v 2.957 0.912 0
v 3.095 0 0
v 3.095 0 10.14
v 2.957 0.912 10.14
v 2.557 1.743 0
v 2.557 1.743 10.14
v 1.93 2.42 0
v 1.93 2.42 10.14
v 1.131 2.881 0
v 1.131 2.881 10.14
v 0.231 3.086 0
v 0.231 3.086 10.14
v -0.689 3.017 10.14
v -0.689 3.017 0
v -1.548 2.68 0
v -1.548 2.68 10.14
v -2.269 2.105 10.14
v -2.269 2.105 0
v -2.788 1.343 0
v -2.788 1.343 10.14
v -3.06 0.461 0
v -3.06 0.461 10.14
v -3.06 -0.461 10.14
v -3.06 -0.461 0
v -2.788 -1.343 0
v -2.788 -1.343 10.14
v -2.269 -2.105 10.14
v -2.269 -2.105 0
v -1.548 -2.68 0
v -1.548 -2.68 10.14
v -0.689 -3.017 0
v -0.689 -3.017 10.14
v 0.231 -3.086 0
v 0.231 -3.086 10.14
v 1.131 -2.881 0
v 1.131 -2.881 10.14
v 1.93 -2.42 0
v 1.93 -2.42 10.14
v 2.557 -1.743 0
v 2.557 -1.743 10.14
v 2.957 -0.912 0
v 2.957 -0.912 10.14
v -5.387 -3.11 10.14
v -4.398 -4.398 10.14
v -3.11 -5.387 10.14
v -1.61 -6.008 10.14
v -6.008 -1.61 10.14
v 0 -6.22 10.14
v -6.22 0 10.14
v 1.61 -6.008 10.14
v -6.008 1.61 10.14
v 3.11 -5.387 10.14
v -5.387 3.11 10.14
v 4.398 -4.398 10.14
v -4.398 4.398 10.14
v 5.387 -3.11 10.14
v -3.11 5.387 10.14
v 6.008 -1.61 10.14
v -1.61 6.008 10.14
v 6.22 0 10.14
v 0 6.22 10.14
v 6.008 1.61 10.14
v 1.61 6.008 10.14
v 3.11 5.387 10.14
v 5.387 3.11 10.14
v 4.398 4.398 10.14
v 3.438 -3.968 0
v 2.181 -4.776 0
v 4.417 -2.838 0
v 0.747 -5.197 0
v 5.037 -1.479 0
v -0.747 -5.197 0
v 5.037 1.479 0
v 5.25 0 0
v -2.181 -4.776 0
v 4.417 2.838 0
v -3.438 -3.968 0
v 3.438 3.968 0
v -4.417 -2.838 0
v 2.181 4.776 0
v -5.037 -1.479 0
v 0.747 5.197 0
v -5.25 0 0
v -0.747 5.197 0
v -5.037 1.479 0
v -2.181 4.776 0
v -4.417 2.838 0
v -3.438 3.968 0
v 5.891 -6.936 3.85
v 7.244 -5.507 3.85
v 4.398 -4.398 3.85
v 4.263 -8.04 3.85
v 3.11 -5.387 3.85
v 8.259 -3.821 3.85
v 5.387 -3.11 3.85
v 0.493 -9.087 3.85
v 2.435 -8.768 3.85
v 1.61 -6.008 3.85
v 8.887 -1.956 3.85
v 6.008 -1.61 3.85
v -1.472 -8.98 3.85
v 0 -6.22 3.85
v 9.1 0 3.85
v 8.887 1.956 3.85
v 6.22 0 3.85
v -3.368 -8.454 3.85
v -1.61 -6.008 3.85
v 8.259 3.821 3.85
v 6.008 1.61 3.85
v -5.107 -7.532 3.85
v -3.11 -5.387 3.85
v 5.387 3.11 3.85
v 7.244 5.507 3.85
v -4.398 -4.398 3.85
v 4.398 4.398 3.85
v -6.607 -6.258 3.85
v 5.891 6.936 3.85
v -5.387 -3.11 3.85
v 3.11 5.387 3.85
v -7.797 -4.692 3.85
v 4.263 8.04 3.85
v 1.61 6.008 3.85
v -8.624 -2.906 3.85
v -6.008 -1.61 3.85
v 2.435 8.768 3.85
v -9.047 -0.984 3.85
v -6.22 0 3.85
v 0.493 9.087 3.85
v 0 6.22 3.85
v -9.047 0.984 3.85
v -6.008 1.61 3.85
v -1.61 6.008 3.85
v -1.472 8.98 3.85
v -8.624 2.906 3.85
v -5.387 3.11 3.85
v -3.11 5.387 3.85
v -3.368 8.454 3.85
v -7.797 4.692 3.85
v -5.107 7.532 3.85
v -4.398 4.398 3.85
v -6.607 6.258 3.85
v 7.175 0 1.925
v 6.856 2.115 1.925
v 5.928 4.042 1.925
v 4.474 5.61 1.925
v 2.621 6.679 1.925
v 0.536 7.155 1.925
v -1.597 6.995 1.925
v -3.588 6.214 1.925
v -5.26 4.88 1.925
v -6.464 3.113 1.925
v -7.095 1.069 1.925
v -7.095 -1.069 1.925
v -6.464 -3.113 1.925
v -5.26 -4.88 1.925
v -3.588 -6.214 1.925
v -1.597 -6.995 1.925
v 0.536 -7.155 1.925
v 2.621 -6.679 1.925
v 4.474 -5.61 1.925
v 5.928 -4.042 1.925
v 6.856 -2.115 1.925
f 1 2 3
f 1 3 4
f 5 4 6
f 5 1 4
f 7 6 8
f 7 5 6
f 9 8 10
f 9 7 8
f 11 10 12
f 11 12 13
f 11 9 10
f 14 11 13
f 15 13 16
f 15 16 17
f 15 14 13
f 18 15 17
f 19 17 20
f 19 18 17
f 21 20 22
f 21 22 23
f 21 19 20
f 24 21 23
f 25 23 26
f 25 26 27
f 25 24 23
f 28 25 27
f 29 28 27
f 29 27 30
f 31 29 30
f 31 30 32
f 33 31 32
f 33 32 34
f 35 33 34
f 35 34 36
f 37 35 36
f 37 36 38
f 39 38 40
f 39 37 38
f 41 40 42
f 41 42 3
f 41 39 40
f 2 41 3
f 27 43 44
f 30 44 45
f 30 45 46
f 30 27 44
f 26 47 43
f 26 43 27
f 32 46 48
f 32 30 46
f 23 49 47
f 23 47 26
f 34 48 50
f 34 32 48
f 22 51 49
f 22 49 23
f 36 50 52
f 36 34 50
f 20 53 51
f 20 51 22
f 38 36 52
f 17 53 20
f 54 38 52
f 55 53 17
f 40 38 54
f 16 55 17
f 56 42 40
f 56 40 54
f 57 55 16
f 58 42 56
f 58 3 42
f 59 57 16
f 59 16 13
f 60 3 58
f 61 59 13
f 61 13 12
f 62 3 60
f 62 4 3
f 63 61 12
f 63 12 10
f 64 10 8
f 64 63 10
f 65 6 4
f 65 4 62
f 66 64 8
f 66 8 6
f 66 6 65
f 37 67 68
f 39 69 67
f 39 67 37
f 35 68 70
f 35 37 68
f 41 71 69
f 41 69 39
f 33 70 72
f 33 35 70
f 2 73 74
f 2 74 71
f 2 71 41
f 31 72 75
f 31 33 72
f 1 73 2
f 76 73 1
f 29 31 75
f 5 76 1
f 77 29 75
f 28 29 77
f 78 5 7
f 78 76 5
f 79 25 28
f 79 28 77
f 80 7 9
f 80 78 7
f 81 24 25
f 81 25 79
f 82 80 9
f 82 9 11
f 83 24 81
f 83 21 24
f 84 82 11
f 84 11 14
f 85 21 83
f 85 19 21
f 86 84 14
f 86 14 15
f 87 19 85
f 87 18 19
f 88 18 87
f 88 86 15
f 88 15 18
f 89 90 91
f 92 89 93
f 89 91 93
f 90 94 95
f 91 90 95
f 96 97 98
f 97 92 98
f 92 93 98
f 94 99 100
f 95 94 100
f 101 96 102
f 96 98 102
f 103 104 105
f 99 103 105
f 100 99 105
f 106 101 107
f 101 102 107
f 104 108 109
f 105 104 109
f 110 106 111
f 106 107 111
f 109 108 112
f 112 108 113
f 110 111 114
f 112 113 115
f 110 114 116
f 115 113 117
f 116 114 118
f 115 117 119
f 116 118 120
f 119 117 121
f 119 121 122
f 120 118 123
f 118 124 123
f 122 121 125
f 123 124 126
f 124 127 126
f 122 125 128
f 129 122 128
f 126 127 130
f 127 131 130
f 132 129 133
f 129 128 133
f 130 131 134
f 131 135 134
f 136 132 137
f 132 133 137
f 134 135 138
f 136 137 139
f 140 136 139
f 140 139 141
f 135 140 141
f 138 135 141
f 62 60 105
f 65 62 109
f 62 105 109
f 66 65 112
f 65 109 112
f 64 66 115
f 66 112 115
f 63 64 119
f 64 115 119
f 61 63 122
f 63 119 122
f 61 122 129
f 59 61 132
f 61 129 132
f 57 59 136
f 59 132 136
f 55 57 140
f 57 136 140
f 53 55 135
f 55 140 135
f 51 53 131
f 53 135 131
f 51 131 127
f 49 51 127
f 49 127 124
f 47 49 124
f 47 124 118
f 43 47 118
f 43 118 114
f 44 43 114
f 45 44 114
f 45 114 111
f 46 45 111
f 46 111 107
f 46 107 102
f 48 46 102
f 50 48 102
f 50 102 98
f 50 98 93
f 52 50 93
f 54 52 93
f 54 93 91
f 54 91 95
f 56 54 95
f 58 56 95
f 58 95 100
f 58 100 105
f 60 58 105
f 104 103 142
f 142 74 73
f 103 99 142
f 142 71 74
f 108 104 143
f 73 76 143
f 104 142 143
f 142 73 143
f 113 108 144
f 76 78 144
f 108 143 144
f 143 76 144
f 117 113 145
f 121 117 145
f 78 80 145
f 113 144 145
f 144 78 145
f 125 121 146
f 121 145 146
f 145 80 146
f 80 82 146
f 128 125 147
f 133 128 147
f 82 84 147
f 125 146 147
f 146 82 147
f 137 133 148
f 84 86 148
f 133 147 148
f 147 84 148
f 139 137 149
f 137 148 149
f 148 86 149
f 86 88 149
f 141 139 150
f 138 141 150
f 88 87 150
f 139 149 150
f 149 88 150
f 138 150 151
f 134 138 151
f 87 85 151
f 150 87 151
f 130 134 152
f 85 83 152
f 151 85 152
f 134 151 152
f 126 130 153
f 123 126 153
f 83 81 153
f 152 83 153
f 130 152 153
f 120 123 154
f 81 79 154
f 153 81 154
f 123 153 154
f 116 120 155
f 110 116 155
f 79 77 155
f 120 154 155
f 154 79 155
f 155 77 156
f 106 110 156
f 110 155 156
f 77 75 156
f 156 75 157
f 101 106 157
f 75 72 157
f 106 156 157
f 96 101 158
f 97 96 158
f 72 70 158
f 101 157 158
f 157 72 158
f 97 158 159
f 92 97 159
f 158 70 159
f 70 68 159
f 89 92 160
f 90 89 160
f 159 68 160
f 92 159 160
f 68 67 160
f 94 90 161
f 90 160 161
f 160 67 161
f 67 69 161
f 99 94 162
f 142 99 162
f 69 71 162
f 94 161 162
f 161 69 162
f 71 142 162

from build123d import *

# Parameters (mm, degrees)
ESQUISSE1_R        = 6.22
ESQUISSE1_R_2      = 3.095
BOSS_EXTRU_1_DEPTH = 10.14
ESQUISSE2_R        = 9.1
ESQUISSE2_R_2      = 6.22
BOSS_EXTRU_2_DEPTH = 3.85


with BuildPart() as part:
    # Esquisse1 → Boss.-Extru.1 (new body)
    with BuildSketch(Plane.XY):
        Circle(ESQUISSE1_R)
        Circle(ESQUISSE1_R_2, mode=Mode.SUBTRACT)
    extrude(amount=BOSS_EXTRU_1_DEPTH)

    # Esquisse2 → Boss.-Extru.2 (add)
    with BuildSketch(Plane(origin=(0, 0, 0), x_dir=(-1, 0, 0), z_dir=(0, 0, -1))):
        Circle(ESQUISSE2_R)
        Circle(ESQUISSE2_R_2, mode=Mode.SUBTRACT)
    extrude(amount=-BOSS_EXTRU_2_DEPTH)

    # Enlèvement de matière-Balayage1: sweep along a curve in space
    with BuildLine() as enl_vement_de_mati_re_balayage1_path:
        ThreePointArc((-9.1, 0, 0), (-6.434671709, 6.434671709, 0), (0, 9.1, 0))
        ThreePointArc((0, 9.1, 0), (6.434671709, 6.434671709, 0), (9.1, 0, 0))
        ThreePointArc((9.1, 0, 0), (6.434671709, -6.434671709, 0), (0, -9.1, 0))
        ThreePointArc((0, -9.1, 0), (-6.434671709, -6.434671709, 0), (-9.1, 0, 0))
    # Esquisse3 → Enlèvement de matière-Balayage1 (sweep, cut)
    with BuildSketch(Plane(origin=(0, 0, 0), x_dir=(1, 0, 0), z_dir=(0, 1, 0))):
        Polygon((-9.1, -3.85), (-5.25, 0), (-9.1, 0), align=None)
    sweep(path=enl_vement_de_mati_re_balayage1_path.line, mode=Mode.SUBTRACT)


solid = part.part
